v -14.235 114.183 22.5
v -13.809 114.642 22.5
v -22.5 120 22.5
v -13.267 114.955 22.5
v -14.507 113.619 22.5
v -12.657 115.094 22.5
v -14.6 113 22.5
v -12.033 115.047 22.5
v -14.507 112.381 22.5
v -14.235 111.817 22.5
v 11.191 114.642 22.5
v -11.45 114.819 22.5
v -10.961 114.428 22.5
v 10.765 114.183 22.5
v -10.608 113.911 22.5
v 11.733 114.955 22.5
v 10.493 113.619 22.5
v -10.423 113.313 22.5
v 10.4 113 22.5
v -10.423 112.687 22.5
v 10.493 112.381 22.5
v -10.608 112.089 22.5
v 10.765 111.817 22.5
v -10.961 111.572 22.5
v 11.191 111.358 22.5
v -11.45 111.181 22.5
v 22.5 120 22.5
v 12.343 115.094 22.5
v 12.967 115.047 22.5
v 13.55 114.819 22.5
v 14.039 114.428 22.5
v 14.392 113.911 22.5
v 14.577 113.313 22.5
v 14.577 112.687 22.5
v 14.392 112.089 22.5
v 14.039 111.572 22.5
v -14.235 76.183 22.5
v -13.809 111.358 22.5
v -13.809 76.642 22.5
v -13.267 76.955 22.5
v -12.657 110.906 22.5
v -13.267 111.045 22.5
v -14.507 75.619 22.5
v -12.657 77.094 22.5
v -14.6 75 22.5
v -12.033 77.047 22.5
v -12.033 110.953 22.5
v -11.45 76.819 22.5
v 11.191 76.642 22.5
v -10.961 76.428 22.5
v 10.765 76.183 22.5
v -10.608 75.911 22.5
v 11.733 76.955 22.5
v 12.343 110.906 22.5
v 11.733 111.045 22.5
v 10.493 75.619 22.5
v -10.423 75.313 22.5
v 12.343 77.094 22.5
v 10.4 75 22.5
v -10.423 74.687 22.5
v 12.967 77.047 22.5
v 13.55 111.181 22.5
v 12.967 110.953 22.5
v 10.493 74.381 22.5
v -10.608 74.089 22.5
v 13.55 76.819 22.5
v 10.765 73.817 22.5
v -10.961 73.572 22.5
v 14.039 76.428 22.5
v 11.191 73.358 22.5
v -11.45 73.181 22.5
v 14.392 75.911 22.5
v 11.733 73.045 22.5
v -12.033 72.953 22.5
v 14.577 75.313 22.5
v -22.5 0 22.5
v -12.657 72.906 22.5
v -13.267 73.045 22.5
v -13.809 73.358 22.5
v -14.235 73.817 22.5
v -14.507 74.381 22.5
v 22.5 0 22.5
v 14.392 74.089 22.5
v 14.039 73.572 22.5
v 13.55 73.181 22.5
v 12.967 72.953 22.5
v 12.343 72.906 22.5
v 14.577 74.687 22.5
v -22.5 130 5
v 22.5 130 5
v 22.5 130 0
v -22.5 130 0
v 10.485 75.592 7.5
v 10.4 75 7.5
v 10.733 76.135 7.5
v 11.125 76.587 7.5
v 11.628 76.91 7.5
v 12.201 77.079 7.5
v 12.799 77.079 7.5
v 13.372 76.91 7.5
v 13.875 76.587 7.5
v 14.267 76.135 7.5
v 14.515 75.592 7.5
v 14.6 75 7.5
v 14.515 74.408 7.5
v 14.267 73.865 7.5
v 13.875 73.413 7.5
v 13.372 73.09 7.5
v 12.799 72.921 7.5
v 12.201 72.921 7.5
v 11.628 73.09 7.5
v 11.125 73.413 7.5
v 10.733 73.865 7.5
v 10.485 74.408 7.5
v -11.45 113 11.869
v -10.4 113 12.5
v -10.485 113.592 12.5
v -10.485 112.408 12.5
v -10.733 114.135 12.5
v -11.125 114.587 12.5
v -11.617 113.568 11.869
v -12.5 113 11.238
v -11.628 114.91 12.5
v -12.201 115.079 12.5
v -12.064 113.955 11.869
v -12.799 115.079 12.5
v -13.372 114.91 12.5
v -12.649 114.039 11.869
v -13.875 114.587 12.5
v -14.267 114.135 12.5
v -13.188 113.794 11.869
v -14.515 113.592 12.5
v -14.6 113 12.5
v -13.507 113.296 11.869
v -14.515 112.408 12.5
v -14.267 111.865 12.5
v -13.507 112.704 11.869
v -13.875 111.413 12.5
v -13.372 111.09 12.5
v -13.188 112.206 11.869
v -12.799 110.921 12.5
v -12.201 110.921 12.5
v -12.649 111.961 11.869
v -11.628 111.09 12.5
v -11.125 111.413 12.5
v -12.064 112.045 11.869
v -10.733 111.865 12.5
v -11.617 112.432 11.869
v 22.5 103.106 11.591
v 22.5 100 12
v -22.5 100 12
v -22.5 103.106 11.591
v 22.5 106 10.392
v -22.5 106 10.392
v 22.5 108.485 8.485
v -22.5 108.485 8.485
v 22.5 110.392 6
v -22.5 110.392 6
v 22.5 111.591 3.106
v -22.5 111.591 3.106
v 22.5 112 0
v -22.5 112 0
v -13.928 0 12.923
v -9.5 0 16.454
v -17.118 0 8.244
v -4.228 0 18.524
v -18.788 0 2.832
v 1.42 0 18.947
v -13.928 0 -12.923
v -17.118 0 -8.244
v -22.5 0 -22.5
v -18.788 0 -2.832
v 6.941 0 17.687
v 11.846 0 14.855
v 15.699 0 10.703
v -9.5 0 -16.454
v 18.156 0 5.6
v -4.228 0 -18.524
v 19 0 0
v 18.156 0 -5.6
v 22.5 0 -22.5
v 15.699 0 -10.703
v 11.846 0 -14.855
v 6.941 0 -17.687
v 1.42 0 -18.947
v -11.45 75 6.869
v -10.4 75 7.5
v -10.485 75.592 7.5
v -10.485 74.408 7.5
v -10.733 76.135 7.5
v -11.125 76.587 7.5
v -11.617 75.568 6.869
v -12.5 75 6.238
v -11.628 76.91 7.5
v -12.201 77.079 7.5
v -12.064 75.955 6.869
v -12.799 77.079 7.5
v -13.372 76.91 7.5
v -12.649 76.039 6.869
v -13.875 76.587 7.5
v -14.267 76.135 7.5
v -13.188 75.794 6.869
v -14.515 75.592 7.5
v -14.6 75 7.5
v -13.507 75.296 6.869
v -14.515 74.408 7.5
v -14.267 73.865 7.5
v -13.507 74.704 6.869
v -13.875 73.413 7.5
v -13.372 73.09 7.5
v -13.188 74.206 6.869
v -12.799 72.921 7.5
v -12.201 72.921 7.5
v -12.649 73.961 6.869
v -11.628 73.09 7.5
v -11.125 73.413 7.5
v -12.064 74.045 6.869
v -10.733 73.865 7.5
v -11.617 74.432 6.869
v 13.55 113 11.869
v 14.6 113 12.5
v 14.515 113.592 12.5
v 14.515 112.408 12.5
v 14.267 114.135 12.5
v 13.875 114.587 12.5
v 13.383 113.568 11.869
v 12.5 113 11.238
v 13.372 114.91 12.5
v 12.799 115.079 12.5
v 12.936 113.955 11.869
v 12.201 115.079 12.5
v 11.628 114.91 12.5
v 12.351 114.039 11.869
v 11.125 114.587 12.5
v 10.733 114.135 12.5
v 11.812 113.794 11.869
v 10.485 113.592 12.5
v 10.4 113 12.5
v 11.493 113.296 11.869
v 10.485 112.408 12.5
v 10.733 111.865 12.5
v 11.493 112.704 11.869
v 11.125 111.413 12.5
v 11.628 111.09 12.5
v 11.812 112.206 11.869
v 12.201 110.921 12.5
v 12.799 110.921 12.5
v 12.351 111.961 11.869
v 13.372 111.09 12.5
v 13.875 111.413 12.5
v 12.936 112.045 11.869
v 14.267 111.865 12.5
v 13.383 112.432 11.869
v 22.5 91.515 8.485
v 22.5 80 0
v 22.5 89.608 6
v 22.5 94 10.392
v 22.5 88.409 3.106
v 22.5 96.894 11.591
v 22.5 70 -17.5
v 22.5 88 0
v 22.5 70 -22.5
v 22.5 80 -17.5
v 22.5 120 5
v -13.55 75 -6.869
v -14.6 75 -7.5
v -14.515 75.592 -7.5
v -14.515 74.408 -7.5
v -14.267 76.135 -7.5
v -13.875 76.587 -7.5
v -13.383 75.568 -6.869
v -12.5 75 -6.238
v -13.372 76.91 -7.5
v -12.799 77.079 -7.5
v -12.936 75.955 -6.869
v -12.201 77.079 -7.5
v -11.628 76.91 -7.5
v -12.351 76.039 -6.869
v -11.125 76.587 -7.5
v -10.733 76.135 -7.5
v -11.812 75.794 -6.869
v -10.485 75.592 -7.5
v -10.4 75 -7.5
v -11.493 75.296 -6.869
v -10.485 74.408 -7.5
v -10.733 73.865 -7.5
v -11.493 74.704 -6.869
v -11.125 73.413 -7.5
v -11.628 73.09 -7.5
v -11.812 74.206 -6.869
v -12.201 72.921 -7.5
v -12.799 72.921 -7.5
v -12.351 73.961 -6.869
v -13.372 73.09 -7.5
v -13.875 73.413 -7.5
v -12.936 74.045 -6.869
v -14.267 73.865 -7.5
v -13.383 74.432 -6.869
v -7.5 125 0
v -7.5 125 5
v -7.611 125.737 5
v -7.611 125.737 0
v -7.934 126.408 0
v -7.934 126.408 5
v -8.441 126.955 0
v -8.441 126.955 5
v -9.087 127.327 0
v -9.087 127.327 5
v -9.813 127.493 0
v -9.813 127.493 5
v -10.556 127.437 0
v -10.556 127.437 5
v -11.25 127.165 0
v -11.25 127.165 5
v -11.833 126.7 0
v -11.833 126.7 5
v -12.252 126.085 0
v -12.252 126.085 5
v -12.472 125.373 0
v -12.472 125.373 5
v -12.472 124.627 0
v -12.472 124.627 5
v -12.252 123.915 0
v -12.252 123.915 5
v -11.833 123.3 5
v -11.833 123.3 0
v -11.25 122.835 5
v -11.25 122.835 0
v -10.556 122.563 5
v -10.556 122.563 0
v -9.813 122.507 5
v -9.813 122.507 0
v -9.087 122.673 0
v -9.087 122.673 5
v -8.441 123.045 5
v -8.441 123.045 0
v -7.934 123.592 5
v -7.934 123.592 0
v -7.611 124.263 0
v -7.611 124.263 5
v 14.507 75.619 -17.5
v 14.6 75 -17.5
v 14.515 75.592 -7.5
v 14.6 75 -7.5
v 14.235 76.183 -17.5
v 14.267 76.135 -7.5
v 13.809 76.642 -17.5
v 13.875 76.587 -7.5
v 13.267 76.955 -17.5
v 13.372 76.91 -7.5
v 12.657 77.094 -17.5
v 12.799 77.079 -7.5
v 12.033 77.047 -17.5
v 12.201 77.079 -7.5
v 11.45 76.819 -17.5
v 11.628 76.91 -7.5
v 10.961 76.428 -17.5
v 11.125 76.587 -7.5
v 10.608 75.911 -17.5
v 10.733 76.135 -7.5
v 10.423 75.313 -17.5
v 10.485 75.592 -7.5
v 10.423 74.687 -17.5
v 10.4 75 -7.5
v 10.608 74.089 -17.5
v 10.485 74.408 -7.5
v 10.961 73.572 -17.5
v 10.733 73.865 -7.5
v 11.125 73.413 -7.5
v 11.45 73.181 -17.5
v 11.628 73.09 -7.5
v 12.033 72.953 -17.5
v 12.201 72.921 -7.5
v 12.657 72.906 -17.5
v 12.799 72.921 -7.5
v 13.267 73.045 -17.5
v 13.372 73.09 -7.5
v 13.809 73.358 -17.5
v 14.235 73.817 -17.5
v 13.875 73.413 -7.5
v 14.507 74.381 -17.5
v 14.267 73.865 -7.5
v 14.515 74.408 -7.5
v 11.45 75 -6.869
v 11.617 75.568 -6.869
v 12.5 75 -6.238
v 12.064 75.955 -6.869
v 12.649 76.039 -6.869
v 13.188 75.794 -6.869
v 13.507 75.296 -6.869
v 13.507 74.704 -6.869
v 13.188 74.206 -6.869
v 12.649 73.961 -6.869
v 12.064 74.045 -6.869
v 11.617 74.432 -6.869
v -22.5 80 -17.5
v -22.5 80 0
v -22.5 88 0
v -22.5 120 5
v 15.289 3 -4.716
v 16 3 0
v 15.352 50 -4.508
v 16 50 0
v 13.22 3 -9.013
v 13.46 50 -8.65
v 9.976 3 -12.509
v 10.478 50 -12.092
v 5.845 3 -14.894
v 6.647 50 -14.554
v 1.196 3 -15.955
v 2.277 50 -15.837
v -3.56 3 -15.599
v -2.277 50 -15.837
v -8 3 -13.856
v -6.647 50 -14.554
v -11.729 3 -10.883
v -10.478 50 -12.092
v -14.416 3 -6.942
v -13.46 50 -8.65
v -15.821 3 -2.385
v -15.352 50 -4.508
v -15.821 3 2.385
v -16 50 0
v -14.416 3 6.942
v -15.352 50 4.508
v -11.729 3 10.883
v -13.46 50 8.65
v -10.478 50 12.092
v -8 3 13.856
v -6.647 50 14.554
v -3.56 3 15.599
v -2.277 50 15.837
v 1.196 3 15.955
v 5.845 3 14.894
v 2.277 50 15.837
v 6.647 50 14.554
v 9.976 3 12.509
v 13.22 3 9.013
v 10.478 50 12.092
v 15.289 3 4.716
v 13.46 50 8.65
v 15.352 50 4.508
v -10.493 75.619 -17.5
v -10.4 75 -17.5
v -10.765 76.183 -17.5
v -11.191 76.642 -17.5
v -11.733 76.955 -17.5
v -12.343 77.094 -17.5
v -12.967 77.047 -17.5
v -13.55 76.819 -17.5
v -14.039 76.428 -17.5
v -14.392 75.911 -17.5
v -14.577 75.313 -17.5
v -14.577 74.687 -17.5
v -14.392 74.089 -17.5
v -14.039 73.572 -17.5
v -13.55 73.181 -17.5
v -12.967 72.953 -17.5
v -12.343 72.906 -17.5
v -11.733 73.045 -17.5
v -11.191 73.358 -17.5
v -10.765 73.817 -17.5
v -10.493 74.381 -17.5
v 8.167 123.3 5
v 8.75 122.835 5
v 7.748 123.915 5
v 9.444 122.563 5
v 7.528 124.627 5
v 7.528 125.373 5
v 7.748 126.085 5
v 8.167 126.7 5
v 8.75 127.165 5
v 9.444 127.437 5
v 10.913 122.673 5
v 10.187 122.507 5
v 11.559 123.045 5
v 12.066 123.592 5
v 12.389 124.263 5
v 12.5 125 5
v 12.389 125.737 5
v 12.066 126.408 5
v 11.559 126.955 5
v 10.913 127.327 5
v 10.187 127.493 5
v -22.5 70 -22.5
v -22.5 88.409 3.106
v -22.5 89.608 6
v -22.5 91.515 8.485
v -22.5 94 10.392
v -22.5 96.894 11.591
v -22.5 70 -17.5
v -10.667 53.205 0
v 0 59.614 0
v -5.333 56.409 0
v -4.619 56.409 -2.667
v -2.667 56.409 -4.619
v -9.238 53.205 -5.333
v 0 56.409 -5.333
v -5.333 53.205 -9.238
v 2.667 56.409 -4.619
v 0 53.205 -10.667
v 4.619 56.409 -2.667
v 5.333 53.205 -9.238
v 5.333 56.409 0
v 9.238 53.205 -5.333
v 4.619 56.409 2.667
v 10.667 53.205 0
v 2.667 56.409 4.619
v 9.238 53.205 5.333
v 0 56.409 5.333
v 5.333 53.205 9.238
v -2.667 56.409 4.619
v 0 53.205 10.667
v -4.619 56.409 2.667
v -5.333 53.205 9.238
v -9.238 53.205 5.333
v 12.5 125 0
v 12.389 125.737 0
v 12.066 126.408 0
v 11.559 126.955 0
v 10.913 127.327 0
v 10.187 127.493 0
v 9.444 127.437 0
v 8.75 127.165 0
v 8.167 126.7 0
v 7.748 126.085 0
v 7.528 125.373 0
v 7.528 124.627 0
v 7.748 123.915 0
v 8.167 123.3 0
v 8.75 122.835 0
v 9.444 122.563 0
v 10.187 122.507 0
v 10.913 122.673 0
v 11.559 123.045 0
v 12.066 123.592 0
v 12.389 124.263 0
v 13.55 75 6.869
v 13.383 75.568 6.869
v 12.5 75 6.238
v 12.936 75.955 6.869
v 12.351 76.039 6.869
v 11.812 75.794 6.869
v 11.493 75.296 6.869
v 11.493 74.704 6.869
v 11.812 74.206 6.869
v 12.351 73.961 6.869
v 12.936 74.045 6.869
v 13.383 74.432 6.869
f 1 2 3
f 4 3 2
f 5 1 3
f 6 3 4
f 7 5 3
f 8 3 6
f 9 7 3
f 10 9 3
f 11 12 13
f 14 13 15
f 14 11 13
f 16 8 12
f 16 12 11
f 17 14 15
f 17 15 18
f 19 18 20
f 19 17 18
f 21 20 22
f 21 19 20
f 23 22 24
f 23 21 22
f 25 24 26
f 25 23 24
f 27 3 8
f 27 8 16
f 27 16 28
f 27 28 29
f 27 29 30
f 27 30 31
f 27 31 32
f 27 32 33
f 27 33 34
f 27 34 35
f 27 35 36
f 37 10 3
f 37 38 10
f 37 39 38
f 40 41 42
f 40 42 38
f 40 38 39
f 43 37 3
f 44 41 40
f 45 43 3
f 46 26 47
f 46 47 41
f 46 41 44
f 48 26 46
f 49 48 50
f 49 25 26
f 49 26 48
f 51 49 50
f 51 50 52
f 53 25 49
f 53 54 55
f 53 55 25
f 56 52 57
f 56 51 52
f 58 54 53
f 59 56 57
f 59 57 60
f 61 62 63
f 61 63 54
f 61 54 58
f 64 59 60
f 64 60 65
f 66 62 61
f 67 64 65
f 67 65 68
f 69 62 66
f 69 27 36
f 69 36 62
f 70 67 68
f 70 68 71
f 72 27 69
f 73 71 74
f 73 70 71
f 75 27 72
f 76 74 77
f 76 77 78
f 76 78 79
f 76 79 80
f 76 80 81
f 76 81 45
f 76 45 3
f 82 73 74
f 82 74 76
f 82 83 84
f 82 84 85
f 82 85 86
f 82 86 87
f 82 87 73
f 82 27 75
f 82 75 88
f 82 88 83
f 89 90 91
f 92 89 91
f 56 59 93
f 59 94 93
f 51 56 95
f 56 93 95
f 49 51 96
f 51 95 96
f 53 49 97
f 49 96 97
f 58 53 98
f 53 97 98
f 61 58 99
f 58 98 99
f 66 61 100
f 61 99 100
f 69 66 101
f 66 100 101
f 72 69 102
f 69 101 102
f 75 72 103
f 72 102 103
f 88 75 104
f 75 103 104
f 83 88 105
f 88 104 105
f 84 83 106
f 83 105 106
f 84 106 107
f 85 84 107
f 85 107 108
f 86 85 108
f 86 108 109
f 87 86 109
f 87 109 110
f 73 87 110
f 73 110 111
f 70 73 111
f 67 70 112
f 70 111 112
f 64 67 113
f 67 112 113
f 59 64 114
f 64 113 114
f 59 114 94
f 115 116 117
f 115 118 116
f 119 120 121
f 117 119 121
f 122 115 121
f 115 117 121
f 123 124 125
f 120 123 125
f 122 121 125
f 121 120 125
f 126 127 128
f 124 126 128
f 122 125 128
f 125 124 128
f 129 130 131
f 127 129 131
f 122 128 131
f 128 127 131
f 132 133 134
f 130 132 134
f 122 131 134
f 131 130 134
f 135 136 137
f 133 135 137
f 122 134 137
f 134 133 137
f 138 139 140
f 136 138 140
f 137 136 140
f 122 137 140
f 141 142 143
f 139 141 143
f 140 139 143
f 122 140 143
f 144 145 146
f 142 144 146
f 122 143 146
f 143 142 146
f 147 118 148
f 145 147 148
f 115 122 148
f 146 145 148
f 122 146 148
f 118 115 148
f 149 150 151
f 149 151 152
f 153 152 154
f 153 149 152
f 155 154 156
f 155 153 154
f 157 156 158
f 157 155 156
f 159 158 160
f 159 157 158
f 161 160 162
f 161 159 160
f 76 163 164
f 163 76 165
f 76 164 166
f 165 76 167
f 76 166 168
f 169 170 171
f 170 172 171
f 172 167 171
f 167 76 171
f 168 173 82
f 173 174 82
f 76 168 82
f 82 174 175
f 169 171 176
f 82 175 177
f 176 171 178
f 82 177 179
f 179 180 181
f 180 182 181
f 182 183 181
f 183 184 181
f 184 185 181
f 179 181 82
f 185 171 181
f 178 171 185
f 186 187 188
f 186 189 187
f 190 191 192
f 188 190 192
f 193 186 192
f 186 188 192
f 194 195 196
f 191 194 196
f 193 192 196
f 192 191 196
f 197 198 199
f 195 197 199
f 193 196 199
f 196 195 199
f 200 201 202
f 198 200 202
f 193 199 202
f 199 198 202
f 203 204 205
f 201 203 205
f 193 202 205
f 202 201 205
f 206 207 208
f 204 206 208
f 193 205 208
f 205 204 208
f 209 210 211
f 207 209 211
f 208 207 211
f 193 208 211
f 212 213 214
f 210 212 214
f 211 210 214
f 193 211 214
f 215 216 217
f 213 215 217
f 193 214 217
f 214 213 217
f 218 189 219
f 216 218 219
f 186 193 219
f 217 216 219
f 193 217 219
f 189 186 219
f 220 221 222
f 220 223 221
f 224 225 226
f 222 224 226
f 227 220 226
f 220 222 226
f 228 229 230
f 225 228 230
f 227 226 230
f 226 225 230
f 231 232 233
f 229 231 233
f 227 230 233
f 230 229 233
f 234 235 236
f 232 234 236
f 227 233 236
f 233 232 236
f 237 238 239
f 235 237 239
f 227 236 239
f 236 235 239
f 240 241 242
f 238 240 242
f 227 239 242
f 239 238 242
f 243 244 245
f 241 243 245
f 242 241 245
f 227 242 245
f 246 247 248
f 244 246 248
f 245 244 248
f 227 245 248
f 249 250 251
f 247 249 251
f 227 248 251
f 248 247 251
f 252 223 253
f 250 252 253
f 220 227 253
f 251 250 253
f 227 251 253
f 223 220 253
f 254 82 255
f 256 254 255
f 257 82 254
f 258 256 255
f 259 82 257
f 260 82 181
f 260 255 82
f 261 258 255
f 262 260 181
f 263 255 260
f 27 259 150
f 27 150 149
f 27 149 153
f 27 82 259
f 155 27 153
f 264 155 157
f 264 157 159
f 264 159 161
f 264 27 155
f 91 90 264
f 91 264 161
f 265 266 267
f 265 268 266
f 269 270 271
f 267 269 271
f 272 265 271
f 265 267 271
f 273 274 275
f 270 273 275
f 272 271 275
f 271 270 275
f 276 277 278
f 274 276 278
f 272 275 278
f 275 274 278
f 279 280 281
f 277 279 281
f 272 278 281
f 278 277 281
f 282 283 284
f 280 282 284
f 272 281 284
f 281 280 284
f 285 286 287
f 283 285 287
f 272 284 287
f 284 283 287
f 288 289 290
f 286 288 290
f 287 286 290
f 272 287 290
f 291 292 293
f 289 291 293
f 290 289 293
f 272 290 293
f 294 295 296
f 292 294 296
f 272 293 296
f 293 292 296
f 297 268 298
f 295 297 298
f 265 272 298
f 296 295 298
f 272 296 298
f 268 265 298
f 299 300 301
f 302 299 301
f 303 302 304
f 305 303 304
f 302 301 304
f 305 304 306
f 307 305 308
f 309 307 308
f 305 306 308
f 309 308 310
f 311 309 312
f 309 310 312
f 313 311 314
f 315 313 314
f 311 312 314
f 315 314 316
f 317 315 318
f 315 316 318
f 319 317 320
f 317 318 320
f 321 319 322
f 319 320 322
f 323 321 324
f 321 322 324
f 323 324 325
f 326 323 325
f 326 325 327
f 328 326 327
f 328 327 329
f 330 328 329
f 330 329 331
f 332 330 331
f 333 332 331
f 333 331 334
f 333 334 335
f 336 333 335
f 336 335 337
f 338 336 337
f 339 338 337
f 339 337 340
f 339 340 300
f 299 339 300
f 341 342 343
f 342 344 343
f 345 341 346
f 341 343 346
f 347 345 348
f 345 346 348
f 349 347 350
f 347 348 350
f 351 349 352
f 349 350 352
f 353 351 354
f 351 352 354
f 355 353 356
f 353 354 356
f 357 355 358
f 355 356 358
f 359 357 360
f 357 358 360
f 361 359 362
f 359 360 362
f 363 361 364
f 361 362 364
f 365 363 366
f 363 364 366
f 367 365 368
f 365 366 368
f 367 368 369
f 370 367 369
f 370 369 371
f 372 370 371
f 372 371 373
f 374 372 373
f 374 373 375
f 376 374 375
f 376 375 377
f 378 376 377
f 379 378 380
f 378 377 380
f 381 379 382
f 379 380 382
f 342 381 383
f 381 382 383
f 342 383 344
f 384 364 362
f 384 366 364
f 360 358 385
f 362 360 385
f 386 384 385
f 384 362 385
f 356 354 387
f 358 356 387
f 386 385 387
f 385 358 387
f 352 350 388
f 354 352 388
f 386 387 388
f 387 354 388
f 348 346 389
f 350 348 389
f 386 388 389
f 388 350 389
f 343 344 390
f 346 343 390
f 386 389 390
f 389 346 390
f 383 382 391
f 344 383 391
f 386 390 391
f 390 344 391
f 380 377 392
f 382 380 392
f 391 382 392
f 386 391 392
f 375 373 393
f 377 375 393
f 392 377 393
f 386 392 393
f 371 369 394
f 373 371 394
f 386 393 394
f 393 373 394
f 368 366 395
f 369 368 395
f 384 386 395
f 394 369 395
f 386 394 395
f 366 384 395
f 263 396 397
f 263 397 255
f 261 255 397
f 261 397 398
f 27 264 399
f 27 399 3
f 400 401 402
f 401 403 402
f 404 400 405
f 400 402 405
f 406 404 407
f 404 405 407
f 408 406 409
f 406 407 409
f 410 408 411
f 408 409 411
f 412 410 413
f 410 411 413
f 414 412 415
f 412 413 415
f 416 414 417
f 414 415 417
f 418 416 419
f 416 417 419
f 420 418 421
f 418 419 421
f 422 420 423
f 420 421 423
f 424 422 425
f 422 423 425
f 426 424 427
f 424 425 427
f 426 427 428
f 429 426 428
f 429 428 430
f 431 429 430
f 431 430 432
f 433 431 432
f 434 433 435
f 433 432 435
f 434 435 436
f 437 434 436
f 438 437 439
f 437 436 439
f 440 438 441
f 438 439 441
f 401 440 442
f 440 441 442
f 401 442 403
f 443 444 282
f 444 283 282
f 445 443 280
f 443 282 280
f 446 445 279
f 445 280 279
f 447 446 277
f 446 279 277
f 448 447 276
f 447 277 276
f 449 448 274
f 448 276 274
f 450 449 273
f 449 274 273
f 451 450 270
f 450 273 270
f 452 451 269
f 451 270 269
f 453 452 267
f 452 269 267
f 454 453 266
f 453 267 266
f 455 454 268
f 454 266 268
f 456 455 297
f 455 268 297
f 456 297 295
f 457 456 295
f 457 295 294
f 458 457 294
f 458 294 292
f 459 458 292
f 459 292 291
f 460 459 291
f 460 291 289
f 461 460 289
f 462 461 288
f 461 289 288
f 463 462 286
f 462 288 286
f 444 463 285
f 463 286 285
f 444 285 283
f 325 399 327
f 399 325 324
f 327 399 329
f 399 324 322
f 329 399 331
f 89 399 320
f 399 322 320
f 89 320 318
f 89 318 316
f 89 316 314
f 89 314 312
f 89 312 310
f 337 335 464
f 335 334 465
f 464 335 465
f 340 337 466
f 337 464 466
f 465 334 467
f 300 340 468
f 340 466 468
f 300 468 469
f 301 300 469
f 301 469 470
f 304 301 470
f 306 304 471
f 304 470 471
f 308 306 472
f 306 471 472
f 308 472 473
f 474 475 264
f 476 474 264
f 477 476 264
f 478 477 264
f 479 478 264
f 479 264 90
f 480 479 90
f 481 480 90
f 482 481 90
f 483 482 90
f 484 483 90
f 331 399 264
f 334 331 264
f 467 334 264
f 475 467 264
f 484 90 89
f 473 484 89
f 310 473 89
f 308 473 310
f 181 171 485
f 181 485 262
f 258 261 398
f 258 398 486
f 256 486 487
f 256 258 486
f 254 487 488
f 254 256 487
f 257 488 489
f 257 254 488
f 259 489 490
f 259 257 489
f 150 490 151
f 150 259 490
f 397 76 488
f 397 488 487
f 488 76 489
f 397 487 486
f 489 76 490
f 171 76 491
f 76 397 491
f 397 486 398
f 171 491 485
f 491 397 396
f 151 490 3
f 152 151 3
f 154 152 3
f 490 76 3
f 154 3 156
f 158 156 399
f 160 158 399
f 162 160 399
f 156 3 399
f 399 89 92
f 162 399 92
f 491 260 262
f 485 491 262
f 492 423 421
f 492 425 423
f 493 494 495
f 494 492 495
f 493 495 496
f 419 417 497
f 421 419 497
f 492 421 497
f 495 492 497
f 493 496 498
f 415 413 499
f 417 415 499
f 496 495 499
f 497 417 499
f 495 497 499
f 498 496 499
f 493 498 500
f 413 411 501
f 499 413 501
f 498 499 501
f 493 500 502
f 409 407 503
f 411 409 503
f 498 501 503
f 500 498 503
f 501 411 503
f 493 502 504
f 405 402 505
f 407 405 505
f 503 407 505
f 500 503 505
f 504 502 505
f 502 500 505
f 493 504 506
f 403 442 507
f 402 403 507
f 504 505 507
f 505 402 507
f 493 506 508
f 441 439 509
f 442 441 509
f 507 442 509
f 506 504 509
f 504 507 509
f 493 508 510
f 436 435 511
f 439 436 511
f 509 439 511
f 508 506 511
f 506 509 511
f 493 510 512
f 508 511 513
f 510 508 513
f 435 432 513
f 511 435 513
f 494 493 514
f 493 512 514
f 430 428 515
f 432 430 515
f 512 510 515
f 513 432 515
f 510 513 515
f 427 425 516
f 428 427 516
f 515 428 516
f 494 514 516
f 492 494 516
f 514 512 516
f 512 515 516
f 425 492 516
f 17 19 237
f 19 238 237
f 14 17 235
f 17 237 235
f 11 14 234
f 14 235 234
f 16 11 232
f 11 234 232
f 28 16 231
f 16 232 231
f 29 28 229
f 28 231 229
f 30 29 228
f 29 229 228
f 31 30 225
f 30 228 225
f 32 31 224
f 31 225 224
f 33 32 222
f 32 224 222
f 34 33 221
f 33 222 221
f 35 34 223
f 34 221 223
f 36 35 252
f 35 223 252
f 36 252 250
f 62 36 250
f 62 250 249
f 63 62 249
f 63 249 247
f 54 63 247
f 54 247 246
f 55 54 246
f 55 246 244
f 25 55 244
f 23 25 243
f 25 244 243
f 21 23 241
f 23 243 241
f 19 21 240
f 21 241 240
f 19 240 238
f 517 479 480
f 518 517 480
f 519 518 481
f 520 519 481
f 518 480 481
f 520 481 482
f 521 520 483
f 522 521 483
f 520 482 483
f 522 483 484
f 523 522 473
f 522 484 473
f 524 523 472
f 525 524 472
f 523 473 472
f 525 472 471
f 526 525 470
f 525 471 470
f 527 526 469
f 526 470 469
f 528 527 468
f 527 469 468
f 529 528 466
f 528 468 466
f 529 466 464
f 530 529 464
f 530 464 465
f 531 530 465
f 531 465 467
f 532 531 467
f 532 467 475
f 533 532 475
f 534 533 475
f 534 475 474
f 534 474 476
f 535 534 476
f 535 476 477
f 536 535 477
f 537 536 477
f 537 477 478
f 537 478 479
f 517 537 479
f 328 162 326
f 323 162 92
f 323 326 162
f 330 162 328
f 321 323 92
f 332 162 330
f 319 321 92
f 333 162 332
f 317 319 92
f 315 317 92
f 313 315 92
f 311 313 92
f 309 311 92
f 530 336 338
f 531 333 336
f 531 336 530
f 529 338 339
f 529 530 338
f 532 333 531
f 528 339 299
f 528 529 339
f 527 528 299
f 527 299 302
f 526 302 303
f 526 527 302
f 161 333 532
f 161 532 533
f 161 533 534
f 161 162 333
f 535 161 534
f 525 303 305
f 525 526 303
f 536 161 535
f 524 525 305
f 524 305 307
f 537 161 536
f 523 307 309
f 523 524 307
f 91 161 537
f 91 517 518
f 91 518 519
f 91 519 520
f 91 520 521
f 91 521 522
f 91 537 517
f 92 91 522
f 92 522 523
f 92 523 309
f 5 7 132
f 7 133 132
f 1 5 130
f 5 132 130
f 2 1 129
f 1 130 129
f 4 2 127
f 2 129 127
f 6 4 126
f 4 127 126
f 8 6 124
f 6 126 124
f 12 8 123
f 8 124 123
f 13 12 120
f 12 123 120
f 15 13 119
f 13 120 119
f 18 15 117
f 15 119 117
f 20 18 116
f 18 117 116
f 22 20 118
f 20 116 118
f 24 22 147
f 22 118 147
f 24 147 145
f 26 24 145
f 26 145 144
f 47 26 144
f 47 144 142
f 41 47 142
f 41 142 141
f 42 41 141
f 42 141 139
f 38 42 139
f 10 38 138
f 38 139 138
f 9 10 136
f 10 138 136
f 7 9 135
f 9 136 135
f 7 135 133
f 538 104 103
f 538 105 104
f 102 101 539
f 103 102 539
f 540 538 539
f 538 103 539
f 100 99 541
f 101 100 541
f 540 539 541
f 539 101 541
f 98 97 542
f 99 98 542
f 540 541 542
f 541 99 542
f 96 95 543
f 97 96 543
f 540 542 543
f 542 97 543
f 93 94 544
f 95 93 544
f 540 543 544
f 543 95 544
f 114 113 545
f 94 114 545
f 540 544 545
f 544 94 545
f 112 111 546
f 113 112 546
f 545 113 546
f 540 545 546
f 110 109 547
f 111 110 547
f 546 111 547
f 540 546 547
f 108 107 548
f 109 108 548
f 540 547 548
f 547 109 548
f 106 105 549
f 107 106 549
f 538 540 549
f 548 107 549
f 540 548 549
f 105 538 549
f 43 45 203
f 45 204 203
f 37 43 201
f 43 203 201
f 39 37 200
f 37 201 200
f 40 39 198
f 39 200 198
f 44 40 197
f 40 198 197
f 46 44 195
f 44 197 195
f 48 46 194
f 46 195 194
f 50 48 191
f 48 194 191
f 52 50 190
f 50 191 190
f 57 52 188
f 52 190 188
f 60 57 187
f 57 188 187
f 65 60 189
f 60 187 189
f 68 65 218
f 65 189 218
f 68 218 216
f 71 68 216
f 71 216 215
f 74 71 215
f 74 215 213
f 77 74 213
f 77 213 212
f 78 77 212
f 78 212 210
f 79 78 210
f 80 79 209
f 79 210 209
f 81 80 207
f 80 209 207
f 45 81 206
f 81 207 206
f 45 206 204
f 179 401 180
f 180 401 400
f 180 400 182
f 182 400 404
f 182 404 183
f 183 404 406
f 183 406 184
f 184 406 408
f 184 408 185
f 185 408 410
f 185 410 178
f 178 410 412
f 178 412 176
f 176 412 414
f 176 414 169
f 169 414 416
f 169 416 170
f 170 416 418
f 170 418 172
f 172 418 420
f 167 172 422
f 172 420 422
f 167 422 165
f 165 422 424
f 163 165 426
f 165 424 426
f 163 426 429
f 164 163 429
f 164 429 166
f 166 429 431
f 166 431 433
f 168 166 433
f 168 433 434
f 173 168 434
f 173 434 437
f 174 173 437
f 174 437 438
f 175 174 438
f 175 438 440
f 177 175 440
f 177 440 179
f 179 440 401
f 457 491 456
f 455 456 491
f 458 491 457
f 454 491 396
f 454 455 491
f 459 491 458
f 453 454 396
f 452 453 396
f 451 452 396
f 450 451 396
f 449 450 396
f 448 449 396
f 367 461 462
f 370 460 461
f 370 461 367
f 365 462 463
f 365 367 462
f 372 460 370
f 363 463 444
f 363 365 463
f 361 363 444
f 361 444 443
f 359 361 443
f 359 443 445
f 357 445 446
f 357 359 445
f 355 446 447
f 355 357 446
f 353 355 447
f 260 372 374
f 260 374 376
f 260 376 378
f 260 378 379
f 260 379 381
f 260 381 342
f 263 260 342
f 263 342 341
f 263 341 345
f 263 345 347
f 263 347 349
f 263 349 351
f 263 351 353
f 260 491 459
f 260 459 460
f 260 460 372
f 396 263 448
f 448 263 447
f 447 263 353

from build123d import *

# Parameters (mm, degrees)
SKETCH_1_W                       = 45
SKETCH_1_H                       = 45
EXTRUDE_1_DEPTH                  = 80
HOLE_WIZARD_M36_1_D              = 32
HOLE_WIZARD_M36_1_DEPTH          = 50
HOLE_WIZARD_M36_1_CSINK_D        = 38
HOLE_WIZARD_M36_1_CSINK_ANGLE    = 90
HOLE_WIZARD_M36_1_TIP            = 9.613769904
SKETCH_6_W                       = 5
SKETCH_6_H                       = 10
EXTRUDE_2_DEPTH                  = 45
SKETCH_7_R                       = 2.5
CUT_EXTRUDE_1_DEPTH              = 135.768319719
SKETCH_8_W                       = 5
SKETCH_8_H                       = 10
CUT_EXTRUDE_2_DEPTH              = 140.396018595
HOLE_WIZARD_M5_1_D               = 4.2
HOLE_WIZARD_M5_1_DEPTH           = 15
HOLE_WIZARD_M5_1_TIP             = 1.2618073
HOLE_WIZARD_M5_2_D               = 4.2
HOLE_WIZARD_M5_2_DEPTH           = 10
HOLE_WIZARD_M5_2_TIP             = 1.2618073
HOLE_WIZARD_M5_2_ON_FACE_2_D     = 4.2
HOLE_WIZARD_M5_2_ON_FACE_2_DEPTH = 10
HOLE_WIZARD_M5_2_ON_FACE_2_TIP   = 1.2618073


with BuildPart() as part:
    # 草图1 → 凸台-拉伸1 (new body)
    with BuildSketch(Plane(origin=(0, 0, 0), x_dir=(1, 0, 0), z_dir=(0, 1, 0))):
        Rectangle(SKETCH_1_W, SKETCH_1_H)
    extrude(amount=EXTRUDE_1_DEPTH)

    # M36 螺纹孔1
    with Locations(Plane(origin=(0, 0, 0), x_dir=(-1, 0, 0), z_dir=(0, -1, 0))):
        with Locations((0, 0)):
            CounterSinkHole(HOLE_WIZARD_M36_1_D / 2, HOLE_WIZARD_M36_1_CSINK_D / 2, depth=HOLE_WIZARD_M36_1_DEPTH, counter_sink_angle=HOLE_WIZARD_M36_1_CSINK_ANGLE)
            with Locations((0, 0, -(HOLE_WIZARD_M36_1_DEPTH + HOLE_WIZARD_M36_1_TIP / 2))):  # 118° drill point
                Cone(0, HOLE_WIZARD_M36_1_D / 2, HOLE_WIZARD_M36_1_TIP, mode=Mode.SUBTRACT)

    # 草图6 → 凸台-拉伸2 (add)
    with BuildSketch(Plane(origin=(22.5, 0, 0), x_dir=(0, 0, -1), z_dir=(1, 0, 0))):
        with BuildLine():
            Line((-22.5, 100), (-22.5, 80))
            Line((-22.5, 80), (0, 80))
            Line((0, 80), (0, 88))
            ThreePointArc((0, 88), (-8.485281374, 91.514718626), (-12, 100))
            Line((-12, 100), (-22.5, 100))
        make_face()
        with BuildLine():
            Line((-22.5, 120), (-22.5, 100))
            Line((-22.5, 100), (-12, 100))
            ThreePointArc((-12, 100), (-8.485281374, 108.485281374), (0, 112))
            Line((0, 112), (0, 120))
            Line((0, 120), (-5, 120))
            Line((-5, 120), (-22.5, 120))
        make_face()
        with Locations((-2.5, 125)):
            Rectangle(SKETCH_6_W, SKETCH_6_H)
    extrude(amount=-EXTRUDE_2_DEPTH)

    # 草图7 → 切除-拉伸1 (cut, through all)
    with BuildSketch(Plane.XY.offset(5)):
        with Locations((10, 125)):
            Circle(SKETCH_7_R)
        with Locations((-10, 125)):
            Circle(SKETCH_7_R)
    extrude(amount=-CUT_EXTRUDE_1_DEPTH, mode=Mode.SUBTRACT)

    # 草图8 → 切除-拉伸2 (cut, through all)
    with BuildSketch(Plane(origin=(22.5, 0, 0), x_dir=(0, 0, -1), z_dir=(1, 0, 0))):
        with Locations((20, 75)):
            Rectangle(SKETCH_8_W, SKETCH_8_H)
    extrude(amount=-CUT_EXTRUDE_2_DEPTH, mode=Mode.SUBTRACT)

    # M5 螺纹孔的螺纹孔钻头1
    with Locations(Plane(origin=(-12.5, 75, 22.5), x_dir=(1, 0, 0), z_dir=(0, 0, 1))):
        with Locations((0, 0), (25, 0)):
            Hole(HOLE_WIZARD_M5_1_D / 2, depth=HOLE_WIZARD_M5_1_DEPTH)
            with Locations((0, 0, -(HOLE_WIZARD_M5_1_DEPTH + HOLE_WIZARD_M5_1_TIP / 2))):  # 118° drill point
                Cone(0, HOLE_WIZARD_M5_1_D / 2, HOLE_WIZARD_M5_1_TIP, mode=Mode.SUBTRACT)

    # M5 螺纹孔的螺纹孔钻头2
    with Locations(Plane(origin=(12.5, 75, -17.5), x_dir=(-1, 0, 0), z_dir=(0, 0, -1))):
        with Locations((0, 0), (25, 0)):
            Hole(HOLE_WIZARD_M5_2_D / 2, depth=HOLE_WIZARD_M5_2_DEPTH)
            with Locations((0, 0, -(HOLE_WIZARD_M5_2_DEPTH + HOLE_WIZARD_M5_2_TIP / 2))):  # 118° drill point
                Cone(0, HOLE_WIZARD_M5_2_D / 2, HOLE_WIZARD_M5_2_TIP, mode=Mode.SUBTRACT)

    # M5 螺纹孔的螺纹孔钻头2 on face 2
    with Locations(Plane(origin=(-12.5, 113, 22.5), x_dir=(1, 0, 0), z_dir=(0, 0, 1))):
        with Locations((0, 0), (25, 0)):
            Hole(HOLE_WIZARD_M5_2_ON_FACE_2_D / 2, depth=HOLE_WIZARD_M5_2_ON_FACE_2_DEPTH)
            with Locations((0, 0, -(HOLE_WIZARD_M5_2_ON_FACE_2_DEPTH + HOLE_WIZARD_M5_2_ON_FACE_2_TIP / 2))):  # 118° drill point
                Cone(0, HOLE_WIZARD_M5_2_ON_FACE_2_D / 2, HOLE_WIZARD_M5_2_ON_FACE_2_TIP, mode=Mode.SUBTRACT)


solid = part.part
